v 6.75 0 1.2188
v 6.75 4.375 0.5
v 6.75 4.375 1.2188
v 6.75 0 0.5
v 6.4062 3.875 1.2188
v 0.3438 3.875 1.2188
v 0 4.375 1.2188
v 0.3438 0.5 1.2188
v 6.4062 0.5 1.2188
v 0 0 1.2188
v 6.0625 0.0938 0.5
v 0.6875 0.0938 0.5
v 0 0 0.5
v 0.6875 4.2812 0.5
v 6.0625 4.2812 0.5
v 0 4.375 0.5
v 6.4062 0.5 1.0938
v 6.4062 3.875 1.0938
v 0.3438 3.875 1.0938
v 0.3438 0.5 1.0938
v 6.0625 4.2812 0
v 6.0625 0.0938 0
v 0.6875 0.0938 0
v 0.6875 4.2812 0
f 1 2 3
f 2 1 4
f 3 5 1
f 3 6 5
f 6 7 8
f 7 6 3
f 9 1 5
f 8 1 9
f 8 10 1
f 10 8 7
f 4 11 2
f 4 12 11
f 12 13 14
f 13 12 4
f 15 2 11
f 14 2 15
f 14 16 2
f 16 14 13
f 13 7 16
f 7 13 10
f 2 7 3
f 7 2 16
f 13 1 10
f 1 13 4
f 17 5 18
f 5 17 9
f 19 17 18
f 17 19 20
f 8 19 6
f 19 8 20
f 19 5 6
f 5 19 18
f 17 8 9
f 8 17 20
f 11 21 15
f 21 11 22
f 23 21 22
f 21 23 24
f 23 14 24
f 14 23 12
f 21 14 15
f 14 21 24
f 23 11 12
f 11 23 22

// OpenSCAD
use <MCAD/boxes.scad>

// Fidelity of all objects rendered, increase for final print
$fn = 50;

// Display (measurements in inches)
lcd_housing      = [6.75   , 4.375 , 0.71875];
lcd_bezel_inset  = [6.0625 , 3.375 , 0.12515];
lcd_bezel_offset = [0.34375, 0.5   , 1.09375];
port_housing     = [5.375  , 4.1875, 0.5    ];

module monitor(){
	difference(){
		translate([0, 0, 0.5])
		cube(lcd_housing);
		translate(lcd_bezel_offset)
		cube(lcd_bezel_inset);
	}
	translate([0.6875, 0.09375, 0])
	cube(port_housing);
}

module libre_renegade(){}

monitor();
